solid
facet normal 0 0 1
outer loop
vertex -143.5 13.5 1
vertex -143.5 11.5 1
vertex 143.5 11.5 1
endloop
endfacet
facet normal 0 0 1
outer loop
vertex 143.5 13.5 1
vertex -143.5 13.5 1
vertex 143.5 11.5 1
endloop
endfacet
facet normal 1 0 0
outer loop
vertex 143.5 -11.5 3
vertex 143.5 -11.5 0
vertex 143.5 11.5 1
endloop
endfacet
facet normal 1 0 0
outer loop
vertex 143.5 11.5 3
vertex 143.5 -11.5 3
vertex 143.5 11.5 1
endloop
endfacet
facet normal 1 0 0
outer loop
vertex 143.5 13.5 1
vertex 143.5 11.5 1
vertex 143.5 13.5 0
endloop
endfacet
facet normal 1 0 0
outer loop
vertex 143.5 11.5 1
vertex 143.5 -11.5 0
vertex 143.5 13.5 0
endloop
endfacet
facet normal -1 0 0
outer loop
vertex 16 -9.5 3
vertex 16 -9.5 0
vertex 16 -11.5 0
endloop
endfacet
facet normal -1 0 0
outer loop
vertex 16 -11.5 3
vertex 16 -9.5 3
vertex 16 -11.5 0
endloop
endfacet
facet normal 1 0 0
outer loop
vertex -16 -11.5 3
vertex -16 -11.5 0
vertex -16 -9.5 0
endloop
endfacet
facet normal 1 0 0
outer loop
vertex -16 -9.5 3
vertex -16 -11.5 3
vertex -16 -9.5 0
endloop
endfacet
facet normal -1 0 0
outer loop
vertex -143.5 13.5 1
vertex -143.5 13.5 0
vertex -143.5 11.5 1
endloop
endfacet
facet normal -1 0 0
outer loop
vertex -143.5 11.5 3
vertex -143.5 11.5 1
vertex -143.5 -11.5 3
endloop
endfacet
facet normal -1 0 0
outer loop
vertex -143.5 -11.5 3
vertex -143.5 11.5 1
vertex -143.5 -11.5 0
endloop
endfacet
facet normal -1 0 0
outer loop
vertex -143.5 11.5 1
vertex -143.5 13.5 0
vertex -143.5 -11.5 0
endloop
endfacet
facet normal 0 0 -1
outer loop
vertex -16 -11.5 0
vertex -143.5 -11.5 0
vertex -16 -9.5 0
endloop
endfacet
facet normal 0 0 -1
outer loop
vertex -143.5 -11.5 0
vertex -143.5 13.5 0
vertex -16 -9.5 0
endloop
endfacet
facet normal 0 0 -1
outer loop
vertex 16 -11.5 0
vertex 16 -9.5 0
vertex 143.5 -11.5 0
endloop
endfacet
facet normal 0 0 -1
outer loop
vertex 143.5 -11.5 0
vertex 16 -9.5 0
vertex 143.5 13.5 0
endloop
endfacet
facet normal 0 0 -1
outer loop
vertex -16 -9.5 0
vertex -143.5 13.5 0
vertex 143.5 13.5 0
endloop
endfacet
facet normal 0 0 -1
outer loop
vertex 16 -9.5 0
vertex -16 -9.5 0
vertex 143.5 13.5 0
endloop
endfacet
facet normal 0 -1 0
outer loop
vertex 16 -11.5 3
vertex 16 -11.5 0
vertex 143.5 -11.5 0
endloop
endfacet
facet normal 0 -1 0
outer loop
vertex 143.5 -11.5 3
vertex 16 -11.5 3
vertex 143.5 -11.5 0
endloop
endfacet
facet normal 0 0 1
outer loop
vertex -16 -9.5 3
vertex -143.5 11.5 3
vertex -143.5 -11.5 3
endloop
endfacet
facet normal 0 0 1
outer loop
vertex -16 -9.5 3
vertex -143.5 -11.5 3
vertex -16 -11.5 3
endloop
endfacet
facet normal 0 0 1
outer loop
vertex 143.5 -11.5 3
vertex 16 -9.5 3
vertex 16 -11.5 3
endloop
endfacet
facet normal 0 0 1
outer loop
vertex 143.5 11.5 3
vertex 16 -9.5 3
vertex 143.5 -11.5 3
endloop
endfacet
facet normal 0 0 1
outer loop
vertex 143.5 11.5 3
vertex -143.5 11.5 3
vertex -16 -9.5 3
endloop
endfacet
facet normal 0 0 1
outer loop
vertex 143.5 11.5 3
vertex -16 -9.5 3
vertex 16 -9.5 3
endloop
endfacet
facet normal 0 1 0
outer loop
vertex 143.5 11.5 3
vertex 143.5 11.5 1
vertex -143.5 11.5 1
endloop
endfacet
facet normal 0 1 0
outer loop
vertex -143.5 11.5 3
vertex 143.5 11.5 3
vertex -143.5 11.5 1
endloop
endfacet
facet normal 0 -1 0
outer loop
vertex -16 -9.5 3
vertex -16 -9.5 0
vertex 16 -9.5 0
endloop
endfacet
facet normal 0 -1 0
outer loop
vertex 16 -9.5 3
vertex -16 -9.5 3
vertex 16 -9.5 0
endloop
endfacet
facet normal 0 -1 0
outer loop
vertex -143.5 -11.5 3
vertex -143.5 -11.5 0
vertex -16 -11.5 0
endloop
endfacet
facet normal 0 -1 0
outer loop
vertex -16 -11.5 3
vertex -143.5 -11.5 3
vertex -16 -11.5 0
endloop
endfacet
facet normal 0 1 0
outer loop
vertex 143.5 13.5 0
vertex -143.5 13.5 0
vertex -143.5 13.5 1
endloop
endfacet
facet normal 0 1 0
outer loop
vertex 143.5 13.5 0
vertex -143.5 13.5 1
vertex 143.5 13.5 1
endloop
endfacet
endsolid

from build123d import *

# Parameters (mm, degrees)
PAD_DEPTH    = 3
PAD001_DEPTH = 1


with BuildPart() as part:
    # Sketch → Pad (new body)
    with BuildSketch(Plane.XY):
        Polygon((-143.5, 11.5), (-143.5, -11.5), (-16, -11.5), (-16, -9.5), (16, -9.5), (16, -11.5), (143.5, -11.5), (143.5, 11.5), align=None)
    extrude(amount=PAD_DEPTH)

    # Sketch001 (on Face9 of Pad) → Pad001 (join)
    with BuildSketch(Plane(origin=(0, 0, 0), x_dir=(1, 0, 0), z_dir=(0, 0, -1))):
        Polygon((-143.5, 11.5), (-143.5, -13.5), (143.5, -13.5), (143.5, 11.5), (16, 11.5), (16, 9.5), (-16, 9.5), (-16, 11.5), align=None)
    extrude(amount=-PAD001_DEPTH)


solid = part.part
